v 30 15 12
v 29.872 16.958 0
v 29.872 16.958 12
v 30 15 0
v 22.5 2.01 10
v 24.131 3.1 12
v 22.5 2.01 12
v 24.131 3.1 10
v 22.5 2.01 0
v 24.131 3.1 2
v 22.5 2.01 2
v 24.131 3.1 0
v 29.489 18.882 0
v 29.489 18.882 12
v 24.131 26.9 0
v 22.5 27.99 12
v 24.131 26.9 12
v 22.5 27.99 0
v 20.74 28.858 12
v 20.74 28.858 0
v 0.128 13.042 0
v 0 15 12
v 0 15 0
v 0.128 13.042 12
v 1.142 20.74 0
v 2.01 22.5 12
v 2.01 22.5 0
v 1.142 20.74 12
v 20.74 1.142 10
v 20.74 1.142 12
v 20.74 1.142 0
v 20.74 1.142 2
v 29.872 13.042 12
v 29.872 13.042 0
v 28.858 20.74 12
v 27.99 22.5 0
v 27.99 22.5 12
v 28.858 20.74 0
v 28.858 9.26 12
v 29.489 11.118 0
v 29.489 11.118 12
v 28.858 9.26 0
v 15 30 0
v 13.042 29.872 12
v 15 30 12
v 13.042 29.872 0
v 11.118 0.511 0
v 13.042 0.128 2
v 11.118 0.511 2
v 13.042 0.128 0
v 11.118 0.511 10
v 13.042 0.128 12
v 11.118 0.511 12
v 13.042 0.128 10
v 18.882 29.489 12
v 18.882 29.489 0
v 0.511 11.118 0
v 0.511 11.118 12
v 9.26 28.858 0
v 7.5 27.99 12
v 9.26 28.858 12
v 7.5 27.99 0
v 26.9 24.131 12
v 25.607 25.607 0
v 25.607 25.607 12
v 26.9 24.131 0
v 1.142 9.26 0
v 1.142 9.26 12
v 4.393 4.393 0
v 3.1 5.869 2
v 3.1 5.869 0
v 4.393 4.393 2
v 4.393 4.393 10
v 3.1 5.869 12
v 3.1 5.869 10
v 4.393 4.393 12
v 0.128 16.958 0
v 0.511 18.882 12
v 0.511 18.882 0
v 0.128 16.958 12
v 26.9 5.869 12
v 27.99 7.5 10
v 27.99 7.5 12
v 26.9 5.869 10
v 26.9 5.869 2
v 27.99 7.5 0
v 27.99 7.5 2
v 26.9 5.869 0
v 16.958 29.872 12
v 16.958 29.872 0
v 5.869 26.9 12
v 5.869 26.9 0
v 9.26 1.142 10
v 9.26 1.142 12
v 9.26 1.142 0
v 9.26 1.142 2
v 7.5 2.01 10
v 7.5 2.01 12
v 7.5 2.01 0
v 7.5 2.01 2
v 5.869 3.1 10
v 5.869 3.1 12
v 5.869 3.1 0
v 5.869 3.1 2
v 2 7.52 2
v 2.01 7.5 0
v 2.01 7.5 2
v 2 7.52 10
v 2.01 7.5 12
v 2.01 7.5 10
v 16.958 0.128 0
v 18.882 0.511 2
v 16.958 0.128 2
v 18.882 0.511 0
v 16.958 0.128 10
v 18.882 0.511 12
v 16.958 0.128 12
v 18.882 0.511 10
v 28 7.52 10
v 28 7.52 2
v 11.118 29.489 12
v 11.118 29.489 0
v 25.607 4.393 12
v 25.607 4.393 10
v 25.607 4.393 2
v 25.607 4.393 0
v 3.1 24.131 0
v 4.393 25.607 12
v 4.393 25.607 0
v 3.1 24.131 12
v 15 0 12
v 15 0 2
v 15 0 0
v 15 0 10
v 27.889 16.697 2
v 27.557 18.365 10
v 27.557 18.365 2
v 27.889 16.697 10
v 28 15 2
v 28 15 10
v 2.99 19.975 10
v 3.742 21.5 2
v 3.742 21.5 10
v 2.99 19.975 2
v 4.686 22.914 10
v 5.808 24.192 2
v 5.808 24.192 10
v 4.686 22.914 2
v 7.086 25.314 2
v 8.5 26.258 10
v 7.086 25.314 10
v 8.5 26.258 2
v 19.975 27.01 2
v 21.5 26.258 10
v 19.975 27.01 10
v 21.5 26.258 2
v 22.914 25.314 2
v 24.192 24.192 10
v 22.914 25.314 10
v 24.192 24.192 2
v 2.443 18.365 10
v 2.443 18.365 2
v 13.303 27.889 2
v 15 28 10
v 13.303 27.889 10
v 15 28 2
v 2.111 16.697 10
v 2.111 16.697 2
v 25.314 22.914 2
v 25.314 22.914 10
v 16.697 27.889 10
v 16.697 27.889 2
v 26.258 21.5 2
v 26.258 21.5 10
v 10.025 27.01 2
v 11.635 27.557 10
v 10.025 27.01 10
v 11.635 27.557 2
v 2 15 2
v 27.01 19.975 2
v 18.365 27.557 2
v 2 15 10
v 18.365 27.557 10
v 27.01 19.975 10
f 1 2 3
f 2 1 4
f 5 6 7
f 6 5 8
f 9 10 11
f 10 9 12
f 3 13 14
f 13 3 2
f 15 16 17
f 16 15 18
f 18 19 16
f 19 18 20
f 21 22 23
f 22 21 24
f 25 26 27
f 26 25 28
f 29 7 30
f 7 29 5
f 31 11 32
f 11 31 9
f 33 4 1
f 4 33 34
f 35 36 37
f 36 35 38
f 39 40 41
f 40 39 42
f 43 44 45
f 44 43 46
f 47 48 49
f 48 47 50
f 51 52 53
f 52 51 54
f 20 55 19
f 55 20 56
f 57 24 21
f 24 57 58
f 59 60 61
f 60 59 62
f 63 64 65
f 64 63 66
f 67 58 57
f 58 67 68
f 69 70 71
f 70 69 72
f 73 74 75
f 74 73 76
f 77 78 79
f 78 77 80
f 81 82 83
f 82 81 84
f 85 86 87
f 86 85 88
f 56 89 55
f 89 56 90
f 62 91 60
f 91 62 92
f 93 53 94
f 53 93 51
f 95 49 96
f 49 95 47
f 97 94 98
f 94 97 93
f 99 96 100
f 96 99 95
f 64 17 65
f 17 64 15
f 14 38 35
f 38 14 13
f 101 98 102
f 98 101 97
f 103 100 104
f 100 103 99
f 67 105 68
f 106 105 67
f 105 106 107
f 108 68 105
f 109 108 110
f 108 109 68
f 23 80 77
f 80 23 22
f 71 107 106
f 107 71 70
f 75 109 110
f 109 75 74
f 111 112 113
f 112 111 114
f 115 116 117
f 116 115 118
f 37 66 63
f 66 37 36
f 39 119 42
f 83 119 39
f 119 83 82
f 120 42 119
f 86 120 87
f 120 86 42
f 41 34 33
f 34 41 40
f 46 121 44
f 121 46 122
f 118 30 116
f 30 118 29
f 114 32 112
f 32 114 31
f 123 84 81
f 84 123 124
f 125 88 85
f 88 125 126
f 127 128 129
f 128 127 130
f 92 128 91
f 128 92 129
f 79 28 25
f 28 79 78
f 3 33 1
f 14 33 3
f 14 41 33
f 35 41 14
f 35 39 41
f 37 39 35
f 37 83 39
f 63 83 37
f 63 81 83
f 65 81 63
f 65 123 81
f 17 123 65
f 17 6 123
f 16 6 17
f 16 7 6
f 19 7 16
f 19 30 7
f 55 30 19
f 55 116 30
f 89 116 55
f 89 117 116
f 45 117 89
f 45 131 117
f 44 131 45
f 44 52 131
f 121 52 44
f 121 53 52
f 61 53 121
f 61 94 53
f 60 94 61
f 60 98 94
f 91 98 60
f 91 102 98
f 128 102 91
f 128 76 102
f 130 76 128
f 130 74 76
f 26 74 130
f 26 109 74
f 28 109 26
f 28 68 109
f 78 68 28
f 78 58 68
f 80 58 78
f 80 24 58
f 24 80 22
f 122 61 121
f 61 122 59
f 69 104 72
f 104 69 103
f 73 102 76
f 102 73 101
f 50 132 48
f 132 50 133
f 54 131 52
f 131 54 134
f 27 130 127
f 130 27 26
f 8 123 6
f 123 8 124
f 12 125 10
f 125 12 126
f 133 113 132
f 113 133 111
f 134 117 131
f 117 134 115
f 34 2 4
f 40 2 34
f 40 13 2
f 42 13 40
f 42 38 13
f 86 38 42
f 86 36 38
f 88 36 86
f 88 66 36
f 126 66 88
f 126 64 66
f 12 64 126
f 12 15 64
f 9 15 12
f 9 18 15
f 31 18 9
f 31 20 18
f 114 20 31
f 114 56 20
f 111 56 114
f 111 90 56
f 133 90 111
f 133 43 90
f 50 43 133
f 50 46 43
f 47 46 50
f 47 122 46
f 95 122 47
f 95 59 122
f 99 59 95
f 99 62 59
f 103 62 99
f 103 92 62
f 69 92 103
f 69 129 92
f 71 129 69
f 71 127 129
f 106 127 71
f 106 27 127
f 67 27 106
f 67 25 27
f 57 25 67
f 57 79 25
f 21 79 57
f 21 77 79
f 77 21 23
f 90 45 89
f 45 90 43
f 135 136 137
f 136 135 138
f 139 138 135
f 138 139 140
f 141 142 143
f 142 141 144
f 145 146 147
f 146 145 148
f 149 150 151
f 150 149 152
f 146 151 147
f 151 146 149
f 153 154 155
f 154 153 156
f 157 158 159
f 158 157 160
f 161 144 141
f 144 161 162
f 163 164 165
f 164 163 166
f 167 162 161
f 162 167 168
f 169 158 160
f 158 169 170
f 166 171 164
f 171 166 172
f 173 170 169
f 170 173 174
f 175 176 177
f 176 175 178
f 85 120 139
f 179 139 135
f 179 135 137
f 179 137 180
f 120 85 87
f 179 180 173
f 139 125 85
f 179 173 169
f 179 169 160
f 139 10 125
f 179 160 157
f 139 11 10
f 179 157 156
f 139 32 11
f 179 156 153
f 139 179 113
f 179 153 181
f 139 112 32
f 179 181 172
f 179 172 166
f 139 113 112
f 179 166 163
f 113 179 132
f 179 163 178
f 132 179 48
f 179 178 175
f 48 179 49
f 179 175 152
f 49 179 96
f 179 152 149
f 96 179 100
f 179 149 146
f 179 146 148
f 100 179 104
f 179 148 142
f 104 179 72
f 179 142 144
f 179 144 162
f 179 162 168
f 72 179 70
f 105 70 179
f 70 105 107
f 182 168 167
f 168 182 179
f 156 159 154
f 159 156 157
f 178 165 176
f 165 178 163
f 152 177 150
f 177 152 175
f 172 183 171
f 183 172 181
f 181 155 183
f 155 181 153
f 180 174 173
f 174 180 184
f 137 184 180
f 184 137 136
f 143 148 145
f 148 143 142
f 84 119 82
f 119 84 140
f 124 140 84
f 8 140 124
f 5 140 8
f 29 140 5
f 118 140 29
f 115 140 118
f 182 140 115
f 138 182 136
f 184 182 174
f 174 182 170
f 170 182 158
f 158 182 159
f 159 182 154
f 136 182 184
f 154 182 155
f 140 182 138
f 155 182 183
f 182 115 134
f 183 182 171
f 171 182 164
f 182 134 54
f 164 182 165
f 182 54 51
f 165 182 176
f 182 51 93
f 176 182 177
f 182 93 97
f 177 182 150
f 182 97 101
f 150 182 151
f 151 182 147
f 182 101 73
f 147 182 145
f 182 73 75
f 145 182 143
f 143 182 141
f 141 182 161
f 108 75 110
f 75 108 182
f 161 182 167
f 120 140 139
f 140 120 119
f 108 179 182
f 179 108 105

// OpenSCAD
// units=mm — generated by scad_emitter.py
// part=unnamed
$fn = 48;

difference() { translate([15, 15, 0]) cylinder(h=12, r=15, $fn=$fn); translate([15, 15, 2]) cylinder(h=8, r=13, $fn=$fn); translate([2, -0.5, 2]) cube([26, 15.5, 8]); }
